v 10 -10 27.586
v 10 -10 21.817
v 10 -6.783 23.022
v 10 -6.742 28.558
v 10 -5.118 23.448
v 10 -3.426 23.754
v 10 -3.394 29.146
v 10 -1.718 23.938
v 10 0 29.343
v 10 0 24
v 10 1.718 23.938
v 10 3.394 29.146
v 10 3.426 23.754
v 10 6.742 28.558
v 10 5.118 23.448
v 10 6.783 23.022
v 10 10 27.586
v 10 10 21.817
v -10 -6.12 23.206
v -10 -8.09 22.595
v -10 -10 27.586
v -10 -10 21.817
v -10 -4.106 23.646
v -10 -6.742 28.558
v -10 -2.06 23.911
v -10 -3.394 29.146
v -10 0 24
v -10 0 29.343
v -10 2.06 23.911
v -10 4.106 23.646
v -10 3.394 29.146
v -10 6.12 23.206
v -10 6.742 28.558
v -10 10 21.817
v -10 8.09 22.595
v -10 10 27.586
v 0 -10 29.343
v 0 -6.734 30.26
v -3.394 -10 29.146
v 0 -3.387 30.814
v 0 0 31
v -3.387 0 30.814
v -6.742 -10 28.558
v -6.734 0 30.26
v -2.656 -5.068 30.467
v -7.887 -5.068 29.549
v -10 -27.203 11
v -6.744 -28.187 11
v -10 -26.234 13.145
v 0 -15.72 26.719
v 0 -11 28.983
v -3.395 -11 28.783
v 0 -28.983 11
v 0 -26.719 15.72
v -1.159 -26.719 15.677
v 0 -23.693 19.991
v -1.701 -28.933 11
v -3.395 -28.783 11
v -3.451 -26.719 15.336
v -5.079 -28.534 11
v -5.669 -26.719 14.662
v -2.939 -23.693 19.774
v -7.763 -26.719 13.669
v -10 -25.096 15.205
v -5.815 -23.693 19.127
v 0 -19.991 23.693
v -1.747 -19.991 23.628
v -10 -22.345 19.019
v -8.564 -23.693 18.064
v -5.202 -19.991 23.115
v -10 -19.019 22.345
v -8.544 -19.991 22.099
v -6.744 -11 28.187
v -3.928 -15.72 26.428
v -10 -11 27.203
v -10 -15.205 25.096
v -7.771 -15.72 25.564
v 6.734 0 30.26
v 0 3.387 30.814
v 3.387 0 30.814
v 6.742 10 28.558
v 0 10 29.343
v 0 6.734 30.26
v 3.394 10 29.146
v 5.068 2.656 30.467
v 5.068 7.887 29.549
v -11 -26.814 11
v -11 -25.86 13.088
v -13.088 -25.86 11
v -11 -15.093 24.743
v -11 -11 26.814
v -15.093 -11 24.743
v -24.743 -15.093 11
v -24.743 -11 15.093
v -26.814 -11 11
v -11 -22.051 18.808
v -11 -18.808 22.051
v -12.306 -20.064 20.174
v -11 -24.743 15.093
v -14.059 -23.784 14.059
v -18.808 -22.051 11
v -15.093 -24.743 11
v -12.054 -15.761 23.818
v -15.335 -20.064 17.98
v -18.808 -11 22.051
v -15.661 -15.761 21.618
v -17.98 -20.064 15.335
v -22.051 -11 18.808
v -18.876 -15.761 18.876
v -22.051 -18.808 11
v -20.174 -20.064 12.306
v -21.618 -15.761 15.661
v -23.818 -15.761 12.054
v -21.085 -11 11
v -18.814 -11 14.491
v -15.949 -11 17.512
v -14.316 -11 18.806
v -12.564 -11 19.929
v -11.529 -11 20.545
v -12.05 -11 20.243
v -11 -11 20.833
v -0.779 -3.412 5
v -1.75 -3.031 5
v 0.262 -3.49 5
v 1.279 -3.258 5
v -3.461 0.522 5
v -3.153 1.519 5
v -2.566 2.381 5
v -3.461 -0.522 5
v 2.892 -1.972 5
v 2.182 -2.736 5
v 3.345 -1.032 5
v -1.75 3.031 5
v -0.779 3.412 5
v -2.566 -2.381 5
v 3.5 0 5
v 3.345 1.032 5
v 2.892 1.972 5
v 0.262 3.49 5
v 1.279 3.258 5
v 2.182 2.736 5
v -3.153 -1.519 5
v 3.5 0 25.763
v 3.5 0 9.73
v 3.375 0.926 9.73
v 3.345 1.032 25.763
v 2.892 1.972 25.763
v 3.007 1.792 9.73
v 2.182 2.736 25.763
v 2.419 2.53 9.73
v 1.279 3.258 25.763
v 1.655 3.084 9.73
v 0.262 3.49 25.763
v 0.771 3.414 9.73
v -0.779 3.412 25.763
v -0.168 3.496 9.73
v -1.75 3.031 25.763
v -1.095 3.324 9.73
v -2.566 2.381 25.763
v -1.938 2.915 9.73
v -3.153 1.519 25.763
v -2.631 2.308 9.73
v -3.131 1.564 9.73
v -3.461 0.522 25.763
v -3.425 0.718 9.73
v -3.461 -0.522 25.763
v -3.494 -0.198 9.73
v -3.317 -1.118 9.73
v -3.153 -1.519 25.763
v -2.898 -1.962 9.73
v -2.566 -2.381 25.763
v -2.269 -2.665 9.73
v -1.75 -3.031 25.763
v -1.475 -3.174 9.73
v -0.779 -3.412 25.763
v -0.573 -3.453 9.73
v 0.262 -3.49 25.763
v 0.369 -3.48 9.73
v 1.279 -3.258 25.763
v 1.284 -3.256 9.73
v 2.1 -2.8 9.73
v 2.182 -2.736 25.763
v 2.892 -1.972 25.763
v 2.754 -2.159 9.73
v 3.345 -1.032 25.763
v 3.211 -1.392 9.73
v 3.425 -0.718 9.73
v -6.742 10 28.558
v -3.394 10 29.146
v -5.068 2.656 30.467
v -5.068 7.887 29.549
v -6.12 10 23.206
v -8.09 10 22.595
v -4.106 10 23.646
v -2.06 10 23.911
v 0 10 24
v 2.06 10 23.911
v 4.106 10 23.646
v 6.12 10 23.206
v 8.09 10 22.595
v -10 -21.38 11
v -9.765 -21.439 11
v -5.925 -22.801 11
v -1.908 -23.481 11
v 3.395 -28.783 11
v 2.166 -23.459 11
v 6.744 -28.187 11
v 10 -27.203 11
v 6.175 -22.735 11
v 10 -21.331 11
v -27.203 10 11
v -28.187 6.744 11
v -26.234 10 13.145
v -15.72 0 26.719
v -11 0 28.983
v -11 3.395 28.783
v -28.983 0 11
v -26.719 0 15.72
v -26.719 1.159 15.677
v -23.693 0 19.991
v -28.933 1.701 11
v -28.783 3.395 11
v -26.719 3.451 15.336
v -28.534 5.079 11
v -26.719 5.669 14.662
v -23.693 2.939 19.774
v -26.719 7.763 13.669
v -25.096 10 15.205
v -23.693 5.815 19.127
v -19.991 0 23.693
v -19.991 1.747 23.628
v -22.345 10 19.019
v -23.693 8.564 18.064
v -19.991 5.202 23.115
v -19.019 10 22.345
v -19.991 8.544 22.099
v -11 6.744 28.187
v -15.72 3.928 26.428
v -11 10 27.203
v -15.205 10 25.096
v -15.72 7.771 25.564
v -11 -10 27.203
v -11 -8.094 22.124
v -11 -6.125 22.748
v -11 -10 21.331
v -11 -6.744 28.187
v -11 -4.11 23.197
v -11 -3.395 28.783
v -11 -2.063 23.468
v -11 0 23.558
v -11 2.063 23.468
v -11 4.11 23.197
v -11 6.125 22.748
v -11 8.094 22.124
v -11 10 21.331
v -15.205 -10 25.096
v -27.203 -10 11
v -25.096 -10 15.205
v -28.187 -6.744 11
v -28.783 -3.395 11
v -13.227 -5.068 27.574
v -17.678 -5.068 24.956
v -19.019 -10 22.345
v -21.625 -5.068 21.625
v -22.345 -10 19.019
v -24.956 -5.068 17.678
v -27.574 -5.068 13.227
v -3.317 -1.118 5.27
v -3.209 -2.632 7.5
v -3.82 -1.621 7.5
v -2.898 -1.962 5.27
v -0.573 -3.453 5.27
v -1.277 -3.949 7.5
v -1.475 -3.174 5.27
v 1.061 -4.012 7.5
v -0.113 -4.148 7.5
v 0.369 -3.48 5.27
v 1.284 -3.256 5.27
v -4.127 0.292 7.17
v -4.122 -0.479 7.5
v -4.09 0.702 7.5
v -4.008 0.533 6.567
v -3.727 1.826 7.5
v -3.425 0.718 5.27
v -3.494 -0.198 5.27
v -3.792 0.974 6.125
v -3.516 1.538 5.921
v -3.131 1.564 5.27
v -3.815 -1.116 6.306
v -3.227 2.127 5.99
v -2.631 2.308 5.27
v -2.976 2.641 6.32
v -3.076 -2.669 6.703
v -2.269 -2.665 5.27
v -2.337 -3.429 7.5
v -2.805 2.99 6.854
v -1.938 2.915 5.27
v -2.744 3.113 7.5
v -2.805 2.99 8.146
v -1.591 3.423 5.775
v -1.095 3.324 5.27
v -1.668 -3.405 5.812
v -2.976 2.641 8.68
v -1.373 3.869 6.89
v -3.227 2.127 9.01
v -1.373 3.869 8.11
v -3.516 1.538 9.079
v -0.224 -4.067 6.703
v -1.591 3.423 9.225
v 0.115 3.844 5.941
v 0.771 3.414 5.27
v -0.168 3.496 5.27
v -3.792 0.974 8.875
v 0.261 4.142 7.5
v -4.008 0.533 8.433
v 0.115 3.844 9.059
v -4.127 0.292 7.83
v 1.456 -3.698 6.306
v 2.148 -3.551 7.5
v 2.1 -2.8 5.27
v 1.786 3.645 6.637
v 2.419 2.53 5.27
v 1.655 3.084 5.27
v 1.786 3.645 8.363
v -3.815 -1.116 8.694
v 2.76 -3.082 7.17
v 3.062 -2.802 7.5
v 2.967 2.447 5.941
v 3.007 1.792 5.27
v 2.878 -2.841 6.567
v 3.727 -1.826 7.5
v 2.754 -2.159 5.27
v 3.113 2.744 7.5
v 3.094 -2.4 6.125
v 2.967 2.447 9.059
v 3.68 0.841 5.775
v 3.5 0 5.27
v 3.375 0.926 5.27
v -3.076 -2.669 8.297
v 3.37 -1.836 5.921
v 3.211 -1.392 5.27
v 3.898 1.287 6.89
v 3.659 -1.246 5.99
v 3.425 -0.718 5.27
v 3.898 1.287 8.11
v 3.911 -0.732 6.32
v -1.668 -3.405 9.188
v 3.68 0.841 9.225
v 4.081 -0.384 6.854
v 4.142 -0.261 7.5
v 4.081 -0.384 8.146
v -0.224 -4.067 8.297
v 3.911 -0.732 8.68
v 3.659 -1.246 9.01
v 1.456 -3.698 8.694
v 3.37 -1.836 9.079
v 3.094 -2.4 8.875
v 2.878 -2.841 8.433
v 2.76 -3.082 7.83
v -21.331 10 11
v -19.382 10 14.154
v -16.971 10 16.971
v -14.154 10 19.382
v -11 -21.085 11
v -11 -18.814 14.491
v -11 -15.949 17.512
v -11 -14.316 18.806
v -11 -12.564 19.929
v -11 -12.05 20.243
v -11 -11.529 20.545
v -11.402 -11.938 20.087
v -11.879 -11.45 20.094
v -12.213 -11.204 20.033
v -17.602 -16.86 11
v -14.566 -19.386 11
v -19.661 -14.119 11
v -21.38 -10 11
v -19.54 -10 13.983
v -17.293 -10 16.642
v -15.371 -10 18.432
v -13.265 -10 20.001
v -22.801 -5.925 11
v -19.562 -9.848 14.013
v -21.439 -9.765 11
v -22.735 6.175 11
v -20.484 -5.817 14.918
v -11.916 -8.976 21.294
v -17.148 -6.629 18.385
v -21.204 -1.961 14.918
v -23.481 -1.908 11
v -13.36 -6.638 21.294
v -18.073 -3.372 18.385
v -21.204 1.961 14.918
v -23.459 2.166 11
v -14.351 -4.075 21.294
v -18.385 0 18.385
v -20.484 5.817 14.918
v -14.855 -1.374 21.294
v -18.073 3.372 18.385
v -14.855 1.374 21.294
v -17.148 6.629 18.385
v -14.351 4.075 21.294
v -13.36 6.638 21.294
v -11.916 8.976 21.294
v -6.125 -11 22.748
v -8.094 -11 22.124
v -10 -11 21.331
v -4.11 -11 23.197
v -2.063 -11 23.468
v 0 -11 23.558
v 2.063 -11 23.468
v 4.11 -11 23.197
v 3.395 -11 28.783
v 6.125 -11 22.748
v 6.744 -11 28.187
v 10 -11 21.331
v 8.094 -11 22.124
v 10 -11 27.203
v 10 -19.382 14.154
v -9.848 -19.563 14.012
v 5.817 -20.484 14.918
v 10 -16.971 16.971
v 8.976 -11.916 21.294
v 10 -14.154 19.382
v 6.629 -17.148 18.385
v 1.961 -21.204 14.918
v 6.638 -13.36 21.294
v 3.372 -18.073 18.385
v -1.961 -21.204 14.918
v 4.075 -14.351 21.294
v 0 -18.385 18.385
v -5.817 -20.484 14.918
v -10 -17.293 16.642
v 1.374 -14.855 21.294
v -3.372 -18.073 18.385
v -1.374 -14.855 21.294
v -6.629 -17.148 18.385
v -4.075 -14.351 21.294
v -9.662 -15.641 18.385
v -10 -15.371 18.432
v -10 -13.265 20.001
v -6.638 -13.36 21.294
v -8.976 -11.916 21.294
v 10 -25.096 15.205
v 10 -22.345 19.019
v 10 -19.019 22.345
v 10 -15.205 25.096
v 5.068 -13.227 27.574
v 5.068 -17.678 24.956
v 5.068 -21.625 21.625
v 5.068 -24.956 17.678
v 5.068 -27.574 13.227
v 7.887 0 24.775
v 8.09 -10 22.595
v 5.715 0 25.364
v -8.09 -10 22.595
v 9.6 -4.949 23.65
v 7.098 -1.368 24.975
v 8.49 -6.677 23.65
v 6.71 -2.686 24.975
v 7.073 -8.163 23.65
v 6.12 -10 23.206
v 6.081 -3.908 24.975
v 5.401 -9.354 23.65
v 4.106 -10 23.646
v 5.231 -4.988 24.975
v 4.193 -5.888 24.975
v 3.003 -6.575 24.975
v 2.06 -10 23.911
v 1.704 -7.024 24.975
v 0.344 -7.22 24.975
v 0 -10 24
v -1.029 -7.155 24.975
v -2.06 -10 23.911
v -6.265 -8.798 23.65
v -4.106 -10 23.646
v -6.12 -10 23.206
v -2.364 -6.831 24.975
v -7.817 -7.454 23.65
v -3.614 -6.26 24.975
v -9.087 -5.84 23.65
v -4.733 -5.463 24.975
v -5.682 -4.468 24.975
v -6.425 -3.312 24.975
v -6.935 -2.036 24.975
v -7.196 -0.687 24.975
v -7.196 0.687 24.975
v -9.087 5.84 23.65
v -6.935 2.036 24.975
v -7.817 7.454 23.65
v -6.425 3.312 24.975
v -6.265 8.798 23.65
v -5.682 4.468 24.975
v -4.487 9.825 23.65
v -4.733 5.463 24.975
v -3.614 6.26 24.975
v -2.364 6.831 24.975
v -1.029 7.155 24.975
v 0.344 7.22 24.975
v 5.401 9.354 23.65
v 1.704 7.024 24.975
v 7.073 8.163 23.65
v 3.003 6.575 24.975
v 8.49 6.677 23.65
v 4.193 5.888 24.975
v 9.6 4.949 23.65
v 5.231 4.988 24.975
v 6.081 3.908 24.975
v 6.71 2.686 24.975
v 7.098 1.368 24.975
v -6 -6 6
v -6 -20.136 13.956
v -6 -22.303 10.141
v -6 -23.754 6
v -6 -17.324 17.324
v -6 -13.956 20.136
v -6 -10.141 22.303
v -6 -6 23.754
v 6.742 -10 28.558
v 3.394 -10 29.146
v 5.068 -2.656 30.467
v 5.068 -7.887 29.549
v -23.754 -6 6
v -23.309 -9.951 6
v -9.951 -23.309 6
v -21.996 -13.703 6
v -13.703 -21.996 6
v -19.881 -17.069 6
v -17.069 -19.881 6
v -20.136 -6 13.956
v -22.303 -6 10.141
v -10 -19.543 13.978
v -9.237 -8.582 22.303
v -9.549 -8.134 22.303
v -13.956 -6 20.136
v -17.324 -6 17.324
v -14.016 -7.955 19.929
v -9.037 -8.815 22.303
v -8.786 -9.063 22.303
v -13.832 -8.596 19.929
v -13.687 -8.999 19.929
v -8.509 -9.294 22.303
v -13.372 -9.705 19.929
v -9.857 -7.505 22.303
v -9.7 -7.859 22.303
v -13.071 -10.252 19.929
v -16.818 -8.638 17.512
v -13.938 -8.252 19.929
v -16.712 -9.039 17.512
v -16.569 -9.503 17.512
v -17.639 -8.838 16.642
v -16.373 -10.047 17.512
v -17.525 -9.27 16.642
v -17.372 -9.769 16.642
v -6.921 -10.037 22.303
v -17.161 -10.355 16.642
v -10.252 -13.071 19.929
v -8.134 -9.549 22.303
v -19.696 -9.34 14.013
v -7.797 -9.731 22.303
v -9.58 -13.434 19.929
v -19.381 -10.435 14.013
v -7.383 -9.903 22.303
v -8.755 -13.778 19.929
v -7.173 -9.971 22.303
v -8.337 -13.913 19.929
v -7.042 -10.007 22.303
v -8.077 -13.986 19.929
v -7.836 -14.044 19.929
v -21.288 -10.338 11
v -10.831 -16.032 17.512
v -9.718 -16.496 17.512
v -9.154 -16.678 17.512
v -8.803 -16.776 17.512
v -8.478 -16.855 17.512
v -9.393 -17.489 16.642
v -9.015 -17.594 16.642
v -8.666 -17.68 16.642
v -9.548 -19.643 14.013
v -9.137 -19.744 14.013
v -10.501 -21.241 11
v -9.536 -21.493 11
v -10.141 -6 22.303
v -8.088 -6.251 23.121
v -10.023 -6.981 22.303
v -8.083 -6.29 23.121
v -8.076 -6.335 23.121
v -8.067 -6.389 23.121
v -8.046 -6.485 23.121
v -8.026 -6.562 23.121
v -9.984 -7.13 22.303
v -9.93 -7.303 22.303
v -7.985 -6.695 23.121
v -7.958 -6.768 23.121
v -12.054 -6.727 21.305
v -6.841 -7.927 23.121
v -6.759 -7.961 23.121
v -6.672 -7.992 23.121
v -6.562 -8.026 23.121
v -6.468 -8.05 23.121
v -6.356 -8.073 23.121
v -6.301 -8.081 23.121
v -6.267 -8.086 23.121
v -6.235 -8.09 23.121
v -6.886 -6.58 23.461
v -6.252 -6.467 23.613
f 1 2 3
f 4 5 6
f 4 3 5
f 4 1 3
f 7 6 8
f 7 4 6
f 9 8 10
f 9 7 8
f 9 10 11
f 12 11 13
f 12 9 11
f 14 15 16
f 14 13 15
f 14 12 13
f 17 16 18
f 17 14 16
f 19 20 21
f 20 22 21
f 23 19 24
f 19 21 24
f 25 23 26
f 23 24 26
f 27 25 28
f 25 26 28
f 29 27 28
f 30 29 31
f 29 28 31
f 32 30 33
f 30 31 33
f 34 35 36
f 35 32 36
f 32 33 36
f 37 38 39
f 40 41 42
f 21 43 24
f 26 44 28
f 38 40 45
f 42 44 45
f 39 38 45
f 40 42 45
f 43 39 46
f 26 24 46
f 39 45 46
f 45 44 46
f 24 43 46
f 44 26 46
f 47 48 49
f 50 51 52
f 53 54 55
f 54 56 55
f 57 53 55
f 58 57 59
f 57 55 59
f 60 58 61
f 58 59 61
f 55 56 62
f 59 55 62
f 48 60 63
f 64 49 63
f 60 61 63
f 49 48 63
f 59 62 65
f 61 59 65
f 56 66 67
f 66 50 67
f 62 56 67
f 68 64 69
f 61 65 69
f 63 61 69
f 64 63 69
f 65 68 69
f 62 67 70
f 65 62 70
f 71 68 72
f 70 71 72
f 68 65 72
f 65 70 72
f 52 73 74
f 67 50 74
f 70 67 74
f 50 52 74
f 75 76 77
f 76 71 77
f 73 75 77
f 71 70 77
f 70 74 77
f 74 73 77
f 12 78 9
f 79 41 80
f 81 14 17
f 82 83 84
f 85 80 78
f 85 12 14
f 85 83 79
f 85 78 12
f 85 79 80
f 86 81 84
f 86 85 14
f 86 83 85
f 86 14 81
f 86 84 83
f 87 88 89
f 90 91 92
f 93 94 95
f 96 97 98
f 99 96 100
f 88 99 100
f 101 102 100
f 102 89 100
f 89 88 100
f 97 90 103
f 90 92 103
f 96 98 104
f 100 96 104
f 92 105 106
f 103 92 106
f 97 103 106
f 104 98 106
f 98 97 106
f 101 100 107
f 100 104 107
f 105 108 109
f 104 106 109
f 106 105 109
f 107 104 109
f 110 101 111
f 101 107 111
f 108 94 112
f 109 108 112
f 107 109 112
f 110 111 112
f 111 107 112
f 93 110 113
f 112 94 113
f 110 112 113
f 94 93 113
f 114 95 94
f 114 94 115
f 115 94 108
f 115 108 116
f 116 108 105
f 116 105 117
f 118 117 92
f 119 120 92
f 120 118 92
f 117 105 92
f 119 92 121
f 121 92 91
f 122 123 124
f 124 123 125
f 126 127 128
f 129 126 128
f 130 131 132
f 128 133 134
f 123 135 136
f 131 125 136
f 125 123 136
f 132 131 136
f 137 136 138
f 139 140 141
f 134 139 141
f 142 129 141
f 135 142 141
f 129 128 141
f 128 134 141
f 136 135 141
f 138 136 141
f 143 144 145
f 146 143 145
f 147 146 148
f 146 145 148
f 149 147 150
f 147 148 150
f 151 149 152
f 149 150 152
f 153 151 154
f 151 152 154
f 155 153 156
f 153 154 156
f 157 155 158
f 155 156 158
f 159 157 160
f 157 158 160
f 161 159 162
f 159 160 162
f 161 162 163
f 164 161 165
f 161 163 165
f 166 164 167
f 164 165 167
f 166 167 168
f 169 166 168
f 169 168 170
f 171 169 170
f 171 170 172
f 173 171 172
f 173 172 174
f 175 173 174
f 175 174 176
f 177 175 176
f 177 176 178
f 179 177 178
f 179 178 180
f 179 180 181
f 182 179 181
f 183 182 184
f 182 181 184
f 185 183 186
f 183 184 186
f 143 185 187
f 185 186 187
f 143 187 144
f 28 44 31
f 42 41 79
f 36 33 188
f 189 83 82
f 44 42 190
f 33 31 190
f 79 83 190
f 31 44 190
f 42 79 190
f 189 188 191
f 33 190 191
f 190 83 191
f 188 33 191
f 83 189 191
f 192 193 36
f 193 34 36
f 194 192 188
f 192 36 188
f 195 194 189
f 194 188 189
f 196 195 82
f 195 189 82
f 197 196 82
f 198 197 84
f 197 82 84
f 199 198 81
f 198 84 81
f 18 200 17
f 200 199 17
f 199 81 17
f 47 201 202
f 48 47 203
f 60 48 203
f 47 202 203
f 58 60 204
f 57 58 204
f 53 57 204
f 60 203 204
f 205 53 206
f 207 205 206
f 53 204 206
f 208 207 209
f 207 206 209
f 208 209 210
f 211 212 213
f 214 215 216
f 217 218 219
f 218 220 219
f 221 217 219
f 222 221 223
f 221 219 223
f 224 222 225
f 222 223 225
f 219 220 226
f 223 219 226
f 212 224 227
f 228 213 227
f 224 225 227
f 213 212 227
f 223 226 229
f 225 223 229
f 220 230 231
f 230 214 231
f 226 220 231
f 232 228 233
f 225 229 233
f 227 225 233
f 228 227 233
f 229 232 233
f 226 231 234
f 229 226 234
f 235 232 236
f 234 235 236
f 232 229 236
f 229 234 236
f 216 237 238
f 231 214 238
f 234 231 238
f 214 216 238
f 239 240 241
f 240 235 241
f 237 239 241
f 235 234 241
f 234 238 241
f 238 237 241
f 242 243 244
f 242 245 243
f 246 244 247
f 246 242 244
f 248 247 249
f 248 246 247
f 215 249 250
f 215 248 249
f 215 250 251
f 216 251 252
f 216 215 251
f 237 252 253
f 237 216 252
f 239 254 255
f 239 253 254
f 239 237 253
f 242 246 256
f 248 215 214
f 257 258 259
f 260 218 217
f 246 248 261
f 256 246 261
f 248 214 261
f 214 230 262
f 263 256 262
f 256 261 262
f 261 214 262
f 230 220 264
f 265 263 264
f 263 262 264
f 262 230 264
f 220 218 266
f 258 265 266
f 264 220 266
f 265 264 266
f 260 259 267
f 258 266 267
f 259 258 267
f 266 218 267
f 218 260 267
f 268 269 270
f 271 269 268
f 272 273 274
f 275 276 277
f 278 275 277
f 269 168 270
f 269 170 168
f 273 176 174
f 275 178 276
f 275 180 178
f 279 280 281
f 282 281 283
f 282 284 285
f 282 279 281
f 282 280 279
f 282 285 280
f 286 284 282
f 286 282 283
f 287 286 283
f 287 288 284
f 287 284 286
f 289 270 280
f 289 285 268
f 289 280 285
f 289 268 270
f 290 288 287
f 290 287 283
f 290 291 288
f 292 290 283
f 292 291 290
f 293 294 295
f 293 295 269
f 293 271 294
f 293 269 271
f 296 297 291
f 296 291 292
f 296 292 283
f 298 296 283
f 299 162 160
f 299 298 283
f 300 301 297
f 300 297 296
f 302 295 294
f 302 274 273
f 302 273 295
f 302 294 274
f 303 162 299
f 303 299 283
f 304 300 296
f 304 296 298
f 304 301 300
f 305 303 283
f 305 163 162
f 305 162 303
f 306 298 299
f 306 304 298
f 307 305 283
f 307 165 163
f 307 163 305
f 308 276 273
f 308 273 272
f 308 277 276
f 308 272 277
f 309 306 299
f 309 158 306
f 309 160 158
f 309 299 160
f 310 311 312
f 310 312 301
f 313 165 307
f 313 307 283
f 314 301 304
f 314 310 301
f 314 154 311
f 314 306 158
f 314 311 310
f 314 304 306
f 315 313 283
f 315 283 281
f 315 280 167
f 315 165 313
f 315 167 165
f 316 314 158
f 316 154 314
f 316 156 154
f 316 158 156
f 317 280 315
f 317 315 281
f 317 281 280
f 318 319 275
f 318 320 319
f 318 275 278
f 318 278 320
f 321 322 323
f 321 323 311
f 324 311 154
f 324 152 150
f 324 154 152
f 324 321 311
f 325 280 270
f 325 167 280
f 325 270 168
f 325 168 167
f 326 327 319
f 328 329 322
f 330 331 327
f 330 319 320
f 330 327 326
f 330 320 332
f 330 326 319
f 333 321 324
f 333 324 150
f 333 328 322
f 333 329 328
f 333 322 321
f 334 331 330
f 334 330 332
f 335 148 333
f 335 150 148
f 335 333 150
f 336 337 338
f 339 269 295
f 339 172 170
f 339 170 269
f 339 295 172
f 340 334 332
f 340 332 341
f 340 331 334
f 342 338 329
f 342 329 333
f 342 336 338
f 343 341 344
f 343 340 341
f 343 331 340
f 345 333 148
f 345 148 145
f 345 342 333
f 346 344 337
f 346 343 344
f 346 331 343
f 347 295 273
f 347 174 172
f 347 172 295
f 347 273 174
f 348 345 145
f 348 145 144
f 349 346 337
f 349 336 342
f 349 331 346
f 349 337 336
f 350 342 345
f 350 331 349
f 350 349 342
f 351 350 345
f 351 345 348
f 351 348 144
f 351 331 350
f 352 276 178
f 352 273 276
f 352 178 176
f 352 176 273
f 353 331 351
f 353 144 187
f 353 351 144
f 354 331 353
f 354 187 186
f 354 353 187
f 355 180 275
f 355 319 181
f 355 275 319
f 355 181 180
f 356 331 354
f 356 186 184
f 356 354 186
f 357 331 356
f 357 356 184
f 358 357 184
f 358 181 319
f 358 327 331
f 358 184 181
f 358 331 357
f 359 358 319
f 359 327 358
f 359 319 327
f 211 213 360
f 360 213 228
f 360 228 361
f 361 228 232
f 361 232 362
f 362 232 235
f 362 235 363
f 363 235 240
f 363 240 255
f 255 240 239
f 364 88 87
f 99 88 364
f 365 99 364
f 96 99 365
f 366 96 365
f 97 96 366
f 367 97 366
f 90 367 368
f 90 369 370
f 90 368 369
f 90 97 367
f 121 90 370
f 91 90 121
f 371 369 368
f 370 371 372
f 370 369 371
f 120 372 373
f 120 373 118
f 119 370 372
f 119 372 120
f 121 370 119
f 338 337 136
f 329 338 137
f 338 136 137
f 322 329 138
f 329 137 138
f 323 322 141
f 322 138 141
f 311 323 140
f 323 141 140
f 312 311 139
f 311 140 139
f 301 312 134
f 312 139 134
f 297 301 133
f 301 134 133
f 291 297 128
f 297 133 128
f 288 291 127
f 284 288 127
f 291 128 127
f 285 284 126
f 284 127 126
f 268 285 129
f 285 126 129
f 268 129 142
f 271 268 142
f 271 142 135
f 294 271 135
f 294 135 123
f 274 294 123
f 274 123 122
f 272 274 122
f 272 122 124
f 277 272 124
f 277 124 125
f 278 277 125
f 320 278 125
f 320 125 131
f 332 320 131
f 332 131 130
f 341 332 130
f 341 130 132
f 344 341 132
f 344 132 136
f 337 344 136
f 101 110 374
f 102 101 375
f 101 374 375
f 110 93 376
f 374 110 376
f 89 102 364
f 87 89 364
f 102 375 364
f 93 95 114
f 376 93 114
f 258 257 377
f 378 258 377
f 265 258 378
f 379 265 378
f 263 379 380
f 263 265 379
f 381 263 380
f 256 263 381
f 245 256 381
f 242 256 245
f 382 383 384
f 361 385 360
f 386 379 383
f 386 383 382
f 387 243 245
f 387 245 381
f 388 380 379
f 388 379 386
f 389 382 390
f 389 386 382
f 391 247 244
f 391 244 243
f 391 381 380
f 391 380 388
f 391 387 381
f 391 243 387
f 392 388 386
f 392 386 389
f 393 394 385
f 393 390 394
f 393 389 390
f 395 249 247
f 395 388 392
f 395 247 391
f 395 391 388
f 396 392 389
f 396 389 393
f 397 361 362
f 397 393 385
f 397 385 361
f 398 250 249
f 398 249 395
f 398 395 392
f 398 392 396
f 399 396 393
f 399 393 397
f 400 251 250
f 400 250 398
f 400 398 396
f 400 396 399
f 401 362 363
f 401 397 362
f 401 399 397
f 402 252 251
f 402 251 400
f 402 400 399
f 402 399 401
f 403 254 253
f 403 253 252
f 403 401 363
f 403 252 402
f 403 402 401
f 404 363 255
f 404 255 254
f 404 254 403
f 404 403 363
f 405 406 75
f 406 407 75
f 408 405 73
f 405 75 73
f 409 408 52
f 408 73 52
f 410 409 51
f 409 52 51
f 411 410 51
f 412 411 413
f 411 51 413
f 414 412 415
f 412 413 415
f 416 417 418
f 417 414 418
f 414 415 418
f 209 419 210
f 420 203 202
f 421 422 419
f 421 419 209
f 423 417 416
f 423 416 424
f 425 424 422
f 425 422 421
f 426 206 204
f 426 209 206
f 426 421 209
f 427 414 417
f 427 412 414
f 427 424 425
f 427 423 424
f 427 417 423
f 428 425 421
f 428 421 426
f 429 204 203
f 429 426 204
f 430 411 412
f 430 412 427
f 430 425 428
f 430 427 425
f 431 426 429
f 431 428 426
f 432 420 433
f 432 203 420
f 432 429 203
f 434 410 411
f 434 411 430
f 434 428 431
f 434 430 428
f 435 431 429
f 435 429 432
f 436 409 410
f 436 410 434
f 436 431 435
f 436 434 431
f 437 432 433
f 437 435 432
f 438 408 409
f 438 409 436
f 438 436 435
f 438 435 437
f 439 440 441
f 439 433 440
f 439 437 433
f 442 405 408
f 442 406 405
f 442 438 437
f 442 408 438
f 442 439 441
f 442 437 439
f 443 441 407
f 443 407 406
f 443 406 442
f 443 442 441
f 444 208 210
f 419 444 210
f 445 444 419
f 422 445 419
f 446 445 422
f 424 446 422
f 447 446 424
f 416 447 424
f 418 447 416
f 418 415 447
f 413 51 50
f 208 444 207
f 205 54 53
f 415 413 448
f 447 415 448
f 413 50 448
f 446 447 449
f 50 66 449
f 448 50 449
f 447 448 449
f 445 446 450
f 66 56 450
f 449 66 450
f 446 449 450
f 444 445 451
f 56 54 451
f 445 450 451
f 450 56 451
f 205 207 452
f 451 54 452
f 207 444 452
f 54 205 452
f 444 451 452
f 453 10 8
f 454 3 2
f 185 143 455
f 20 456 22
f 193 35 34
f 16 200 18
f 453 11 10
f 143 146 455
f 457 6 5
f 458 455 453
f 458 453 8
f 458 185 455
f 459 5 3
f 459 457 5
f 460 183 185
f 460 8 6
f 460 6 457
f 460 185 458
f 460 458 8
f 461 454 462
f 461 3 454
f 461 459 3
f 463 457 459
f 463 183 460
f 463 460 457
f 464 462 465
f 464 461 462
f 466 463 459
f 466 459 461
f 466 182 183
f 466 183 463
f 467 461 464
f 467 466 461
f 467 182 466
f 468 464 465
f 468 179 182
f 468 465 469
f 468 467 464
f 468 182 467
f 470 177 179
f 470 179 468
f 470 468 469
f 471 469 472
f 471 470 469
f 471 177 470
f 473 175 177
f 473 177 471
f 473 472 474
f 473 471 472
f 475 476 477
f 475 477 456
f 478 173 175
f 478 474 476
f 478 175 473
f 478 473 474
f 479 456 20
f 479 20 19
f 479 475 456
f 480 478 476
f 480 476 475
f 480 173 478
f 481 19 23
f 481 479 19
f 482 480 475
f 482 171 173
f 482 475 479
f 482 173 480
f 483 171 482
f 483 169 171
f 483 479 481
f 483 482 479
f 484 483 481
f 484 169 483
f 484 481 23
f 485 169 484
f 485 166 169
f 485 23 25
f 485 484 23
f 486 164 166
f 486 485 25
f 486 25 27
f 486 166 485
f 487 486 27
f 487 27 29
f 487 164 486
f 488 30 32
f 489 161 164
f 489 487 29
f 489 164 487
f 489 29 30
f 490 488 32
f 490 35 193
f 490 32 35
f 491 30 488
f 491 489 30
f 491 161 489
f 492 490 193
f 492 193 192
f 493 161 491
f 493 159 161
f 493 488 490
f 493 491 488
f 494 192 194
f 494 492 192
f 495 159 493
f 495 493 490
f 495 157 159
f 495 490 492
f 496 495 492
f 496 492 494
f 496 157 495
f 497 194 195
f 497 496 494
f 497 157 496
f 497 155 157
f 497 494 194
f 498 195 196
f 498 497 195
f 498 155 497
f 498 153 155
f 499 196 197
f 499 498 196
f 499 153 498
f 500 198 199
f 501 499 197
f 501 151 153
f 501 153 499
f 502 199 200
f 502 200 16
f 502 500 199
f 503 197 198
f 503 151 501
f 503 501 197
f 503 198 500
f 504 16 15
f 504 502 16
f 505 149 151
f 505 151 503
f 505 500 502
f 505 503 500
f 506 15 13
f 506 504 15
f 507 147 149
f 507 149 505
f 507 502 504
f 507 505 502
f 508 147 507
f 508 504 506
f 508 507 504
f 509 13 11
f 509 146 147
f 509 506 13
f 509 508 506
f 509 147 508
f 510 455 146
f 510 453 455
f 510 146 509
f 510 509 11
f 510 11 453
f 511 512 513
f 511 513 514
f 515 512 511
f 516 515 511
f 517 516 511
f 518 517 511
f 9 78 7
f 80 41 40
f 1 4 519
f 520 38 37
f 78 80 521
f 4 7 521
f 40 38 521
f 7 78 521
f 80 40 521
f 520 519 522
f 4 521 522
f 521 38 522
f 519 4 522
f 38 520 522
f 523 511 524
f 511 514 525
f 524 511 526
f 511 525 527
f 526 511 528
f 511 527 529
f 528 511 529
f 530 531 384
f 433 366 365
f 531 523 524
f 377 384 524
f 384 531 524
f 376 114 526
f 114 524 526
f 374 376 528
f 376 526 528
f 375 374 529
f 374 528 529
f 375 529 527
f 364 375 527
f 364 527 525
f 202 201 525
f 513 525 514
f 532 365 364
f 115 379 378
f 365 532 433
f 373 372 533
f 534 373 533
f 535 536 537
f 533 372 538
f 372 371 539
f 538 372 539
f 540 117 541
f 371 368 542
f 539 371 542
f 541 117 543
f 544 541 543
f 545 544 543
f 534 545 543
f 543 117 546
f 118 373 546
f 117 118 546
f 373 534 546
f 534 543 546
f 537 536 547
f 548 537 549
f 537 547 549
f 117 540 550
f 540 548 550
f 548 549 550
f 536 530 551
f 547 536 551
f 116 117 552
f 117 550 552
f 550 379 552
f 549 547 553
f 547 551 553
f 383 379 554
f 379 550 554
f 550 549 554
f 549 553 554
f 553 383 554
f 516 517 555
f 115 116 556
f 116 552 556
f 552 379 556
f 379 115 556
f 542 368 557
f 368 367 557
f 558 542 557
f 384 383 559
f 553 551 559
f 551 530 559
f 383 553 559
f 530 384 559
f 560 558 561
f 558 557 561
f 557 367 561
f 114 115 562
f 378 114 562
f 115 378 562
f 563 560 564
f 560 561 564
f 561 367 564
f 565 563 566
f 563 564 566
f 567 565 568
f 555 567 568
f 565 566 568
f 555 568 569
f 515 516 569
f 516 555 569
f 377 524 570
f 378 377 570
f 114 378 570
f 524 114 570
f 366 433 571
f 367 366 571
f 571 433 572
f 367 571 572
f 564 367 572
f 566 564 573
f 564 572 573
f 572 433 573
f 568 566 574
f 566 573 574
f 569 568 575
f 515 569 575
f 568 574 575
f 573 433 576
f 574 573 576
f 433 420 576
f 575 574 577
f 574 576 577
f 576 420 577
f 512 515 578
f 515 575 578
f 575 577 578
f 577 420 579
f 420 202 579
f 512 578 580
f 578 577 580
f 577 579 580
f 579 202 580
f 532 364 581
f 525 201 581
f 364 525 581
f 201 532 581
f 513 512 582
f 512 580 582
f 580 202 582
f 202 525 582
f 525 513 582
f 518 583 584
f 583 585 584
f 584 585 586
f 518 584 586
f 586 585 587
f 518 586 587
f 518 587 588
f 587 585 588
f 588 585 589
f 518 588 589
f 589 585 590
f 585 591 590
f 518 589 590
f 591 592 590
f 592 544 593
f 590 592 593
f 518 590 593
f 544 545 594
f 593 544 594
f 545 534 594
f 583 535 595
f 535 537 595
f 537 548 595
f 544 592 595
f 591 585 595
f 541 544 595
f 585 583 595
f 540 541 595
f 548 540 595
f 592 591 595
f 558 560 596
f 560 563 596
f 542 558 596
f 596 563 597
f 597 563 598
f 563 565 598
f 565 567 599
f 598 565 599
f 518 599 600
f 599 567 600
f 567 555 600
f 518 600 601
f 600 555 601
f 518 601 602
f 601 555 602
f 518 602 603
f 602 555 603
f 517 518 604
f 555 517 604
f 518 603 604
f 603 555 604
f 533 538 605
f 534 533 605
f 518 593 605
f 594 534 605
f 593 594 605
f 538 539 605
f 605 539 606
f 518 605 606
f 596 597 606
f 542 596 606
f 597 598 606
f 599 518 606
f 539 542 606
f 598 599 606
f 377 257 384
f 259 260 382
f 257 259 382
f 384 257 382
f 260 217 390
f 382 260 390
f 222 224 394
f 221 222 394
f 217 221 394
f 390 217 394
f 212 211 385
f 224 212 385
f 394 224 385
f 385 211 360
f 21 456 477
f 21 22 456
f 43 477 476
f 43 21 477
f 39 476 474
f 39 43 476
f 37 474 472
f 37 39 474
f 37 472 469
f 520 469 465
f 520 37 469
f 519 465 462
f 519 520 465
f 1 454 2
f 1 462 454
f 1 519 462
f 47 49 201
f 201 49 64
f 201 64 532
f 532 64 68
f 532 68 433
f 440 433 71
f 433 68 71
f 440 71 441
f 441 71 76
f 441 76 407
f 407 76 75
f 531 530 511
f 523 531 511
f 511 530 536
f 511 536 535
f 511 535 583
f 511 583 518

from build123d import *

# Parameters (mm, degrees)
F0_W          = 62
F0_H          = 62
F1_DEPTH      = 31
F2_R          = 30.99999
F3_DEPTH      = 31
F3_DEPTH_BACK = 11
F7_W          = 63
F7_H          = 63
F8_DEPTH      = 18.9837565917
F10_W         = 63
F10_H         = 63
F11_DEPTH     = 1
F13_W         = 63
F13_H         = 63
F14_DEPTH     = 1
F16_W         = 63
F16_H         = 63
F17_DEPTH     = 25
F20_R         = 3.5
F22_DEPTH     = 22
F24_DEPTH     = 25
F28_ANGLE     = 90
F29_ANGLE     = 90


# Not quite as in the source:
# - a fillet or chamfer is up to 0.001 mm smaller than in the source, because OpenCascade refuses the exact size


with BuildPart() as f1:
    # F0 (on Top) → F1 (new body, symmetric)
    with BuildSketch(Plane.XY):
        Rectangle(F0_W, F0_H)
    extrude(amount=F1_DEPTH, both=True)

    # F2 (radius 31 in the source; OpenCascade refuses exactly that, so slightly less here)
    f2_edges = [f1.edges().sort_by_distance(p)[0] for p in [
        (0, 31, 31),
        (-31, 0, 31),
        (0, -31, 31),
        (31, 0, 31),
        (0, 31, -31),
        (-31, 0, -31),
        (0, -31, -31),
        (31, 0, -31),
        (-31, 31, 0),
        (-31, -31, 0),
        (31, -31, 0),
        (31, 31, 0),
    ]]
    fillet(f2_edges, radius=F2_R)

    # F0 (on Top) → F3 (cut, two sides)
    with BuildSketch(Plane.XY) as f3_sk:
        Rectangle(F0_W, F0_H)
    extrude(amount=-F3_DEPTH, mode=Mode.SUBTRACT)
    extrude(f3_sk.sketch, amount=F3_DEPTH_BACK, mode=Mode.SUBTRACT)

    # F4 (on Front) → F5 (revolve, cut)
    with BuildSketch(Plane.XZ):
        with BuildLine():
            Line((0, 26), (0, -26))
            ThreePointArc((0, -26), (26, 0), (0, 26))
        make_face()
    revolve(axis=Axis((0, 0, 0), (0, 0, -1)), mode=Mode.SUBTRACT)

    # F7 (on offset) → F8 (cut, through all)
    with BuildSketch(Plane.YZ.offset(10)):
        Rectangle(F7_W, F7_H)
    extrude(amount=F8_DEPTH, mode=Mode.SUBTRACT)

    # F10 (on offset) → F11 (cut)
    with BuildSketch(Plane.YZ.offset(-10)):
        Rectangle(F10_W, F10_H)
    extrude(amount=-F11_DEPTH, mode=Mode.SUBTRACT)

    # F13 (on offset) → F14 (cut)
    with BuildSketch(Plane.XZ.offset(10)):
        Rectangle(F13_W, F13_H)
    extrude(amount=F14_DEPTH, mode=Mode.SUBTRACT)

    # F16 (on offset) → F17 (cut)
    with BuildSketch(Plane.XZ.offset(-10)):
        with Locations((0, 6.4033556429)):
            Rectangle(F16_W, F16_H)
    extrude(amount=-F17_DEPTH, mode=Mode.SUBTRACT)

    # F20 (on offset) → F22 (join)
    with BuildSketch(Plane.XY.offset(5)):
        Circle(F20_R)
    extrude(amount=F22_DEPTH)

    # F21 (on offset) → F23 (revolve)
    with BuildSketch(Plane.XY.offset(7.5)):
        with BuildLine():
            Line((3.7268394552, -1.8256964905), (-3.7268394552, 1.8256964905))
            ThreePointArc((-3.7268394552, 1.8256964905), (-1.8256964905, -3.7268394552), (3.7268394552, -1.8256964905))
        make_face()
    revolve(axis=Axis((0, 0, 7.5), (0.8980336037, -0.4399268652, 0)))

    # F20 (on offset) → F24 (cut)
    with BuildSketch(Plane.XY.offset(5)):
        Circle(F20_R)
    extrude(amount=-F24_DEPTH, mode=Mode.SUBTRACT)



with BuildPart() as f28:
    # F26 (on offset) → F28 (revolve)
    with BuildSketch(Plane.XZ.offset(6)):
        with BuildLine():
            Line((-11, 11), (-11, 21.3307290077))
            ThreePointArc((-11, 21.3307290077), (-16.9705627485, 16.9705627485), (-21.3307290077, 11))
            Line((-21.3307290077, 11), (-11, 11))
        make_face()
    revolve(axis=Axis((-11, -6, 0), (0, 0, 1)), revolution_arc=F28_ANGLE)


with BuildPart() as f1_1:
    add(f1.part)

    add(f28.part)  # F29 merges F28
    # F27 (on offset) → F29 (revolve)
    with BuildSketch(Plane.XZ.offset(6)):
        with BuildLine():
            Line((-6, 6), (-6, 23.7539470404))
            ThreePointArc((-6, 23.7539470404), (-17.3241161391, 17.3241161391), (-23.7539470404, 6))
            Line((-23.7539470404, 6), (-6, 6))
        make_face()
    revolve(axis=Axis((-6, -6, 14.8769735202), (0, 0, 1)), revolution_arc=F29_ANGLE)


solid = f1_1.part
